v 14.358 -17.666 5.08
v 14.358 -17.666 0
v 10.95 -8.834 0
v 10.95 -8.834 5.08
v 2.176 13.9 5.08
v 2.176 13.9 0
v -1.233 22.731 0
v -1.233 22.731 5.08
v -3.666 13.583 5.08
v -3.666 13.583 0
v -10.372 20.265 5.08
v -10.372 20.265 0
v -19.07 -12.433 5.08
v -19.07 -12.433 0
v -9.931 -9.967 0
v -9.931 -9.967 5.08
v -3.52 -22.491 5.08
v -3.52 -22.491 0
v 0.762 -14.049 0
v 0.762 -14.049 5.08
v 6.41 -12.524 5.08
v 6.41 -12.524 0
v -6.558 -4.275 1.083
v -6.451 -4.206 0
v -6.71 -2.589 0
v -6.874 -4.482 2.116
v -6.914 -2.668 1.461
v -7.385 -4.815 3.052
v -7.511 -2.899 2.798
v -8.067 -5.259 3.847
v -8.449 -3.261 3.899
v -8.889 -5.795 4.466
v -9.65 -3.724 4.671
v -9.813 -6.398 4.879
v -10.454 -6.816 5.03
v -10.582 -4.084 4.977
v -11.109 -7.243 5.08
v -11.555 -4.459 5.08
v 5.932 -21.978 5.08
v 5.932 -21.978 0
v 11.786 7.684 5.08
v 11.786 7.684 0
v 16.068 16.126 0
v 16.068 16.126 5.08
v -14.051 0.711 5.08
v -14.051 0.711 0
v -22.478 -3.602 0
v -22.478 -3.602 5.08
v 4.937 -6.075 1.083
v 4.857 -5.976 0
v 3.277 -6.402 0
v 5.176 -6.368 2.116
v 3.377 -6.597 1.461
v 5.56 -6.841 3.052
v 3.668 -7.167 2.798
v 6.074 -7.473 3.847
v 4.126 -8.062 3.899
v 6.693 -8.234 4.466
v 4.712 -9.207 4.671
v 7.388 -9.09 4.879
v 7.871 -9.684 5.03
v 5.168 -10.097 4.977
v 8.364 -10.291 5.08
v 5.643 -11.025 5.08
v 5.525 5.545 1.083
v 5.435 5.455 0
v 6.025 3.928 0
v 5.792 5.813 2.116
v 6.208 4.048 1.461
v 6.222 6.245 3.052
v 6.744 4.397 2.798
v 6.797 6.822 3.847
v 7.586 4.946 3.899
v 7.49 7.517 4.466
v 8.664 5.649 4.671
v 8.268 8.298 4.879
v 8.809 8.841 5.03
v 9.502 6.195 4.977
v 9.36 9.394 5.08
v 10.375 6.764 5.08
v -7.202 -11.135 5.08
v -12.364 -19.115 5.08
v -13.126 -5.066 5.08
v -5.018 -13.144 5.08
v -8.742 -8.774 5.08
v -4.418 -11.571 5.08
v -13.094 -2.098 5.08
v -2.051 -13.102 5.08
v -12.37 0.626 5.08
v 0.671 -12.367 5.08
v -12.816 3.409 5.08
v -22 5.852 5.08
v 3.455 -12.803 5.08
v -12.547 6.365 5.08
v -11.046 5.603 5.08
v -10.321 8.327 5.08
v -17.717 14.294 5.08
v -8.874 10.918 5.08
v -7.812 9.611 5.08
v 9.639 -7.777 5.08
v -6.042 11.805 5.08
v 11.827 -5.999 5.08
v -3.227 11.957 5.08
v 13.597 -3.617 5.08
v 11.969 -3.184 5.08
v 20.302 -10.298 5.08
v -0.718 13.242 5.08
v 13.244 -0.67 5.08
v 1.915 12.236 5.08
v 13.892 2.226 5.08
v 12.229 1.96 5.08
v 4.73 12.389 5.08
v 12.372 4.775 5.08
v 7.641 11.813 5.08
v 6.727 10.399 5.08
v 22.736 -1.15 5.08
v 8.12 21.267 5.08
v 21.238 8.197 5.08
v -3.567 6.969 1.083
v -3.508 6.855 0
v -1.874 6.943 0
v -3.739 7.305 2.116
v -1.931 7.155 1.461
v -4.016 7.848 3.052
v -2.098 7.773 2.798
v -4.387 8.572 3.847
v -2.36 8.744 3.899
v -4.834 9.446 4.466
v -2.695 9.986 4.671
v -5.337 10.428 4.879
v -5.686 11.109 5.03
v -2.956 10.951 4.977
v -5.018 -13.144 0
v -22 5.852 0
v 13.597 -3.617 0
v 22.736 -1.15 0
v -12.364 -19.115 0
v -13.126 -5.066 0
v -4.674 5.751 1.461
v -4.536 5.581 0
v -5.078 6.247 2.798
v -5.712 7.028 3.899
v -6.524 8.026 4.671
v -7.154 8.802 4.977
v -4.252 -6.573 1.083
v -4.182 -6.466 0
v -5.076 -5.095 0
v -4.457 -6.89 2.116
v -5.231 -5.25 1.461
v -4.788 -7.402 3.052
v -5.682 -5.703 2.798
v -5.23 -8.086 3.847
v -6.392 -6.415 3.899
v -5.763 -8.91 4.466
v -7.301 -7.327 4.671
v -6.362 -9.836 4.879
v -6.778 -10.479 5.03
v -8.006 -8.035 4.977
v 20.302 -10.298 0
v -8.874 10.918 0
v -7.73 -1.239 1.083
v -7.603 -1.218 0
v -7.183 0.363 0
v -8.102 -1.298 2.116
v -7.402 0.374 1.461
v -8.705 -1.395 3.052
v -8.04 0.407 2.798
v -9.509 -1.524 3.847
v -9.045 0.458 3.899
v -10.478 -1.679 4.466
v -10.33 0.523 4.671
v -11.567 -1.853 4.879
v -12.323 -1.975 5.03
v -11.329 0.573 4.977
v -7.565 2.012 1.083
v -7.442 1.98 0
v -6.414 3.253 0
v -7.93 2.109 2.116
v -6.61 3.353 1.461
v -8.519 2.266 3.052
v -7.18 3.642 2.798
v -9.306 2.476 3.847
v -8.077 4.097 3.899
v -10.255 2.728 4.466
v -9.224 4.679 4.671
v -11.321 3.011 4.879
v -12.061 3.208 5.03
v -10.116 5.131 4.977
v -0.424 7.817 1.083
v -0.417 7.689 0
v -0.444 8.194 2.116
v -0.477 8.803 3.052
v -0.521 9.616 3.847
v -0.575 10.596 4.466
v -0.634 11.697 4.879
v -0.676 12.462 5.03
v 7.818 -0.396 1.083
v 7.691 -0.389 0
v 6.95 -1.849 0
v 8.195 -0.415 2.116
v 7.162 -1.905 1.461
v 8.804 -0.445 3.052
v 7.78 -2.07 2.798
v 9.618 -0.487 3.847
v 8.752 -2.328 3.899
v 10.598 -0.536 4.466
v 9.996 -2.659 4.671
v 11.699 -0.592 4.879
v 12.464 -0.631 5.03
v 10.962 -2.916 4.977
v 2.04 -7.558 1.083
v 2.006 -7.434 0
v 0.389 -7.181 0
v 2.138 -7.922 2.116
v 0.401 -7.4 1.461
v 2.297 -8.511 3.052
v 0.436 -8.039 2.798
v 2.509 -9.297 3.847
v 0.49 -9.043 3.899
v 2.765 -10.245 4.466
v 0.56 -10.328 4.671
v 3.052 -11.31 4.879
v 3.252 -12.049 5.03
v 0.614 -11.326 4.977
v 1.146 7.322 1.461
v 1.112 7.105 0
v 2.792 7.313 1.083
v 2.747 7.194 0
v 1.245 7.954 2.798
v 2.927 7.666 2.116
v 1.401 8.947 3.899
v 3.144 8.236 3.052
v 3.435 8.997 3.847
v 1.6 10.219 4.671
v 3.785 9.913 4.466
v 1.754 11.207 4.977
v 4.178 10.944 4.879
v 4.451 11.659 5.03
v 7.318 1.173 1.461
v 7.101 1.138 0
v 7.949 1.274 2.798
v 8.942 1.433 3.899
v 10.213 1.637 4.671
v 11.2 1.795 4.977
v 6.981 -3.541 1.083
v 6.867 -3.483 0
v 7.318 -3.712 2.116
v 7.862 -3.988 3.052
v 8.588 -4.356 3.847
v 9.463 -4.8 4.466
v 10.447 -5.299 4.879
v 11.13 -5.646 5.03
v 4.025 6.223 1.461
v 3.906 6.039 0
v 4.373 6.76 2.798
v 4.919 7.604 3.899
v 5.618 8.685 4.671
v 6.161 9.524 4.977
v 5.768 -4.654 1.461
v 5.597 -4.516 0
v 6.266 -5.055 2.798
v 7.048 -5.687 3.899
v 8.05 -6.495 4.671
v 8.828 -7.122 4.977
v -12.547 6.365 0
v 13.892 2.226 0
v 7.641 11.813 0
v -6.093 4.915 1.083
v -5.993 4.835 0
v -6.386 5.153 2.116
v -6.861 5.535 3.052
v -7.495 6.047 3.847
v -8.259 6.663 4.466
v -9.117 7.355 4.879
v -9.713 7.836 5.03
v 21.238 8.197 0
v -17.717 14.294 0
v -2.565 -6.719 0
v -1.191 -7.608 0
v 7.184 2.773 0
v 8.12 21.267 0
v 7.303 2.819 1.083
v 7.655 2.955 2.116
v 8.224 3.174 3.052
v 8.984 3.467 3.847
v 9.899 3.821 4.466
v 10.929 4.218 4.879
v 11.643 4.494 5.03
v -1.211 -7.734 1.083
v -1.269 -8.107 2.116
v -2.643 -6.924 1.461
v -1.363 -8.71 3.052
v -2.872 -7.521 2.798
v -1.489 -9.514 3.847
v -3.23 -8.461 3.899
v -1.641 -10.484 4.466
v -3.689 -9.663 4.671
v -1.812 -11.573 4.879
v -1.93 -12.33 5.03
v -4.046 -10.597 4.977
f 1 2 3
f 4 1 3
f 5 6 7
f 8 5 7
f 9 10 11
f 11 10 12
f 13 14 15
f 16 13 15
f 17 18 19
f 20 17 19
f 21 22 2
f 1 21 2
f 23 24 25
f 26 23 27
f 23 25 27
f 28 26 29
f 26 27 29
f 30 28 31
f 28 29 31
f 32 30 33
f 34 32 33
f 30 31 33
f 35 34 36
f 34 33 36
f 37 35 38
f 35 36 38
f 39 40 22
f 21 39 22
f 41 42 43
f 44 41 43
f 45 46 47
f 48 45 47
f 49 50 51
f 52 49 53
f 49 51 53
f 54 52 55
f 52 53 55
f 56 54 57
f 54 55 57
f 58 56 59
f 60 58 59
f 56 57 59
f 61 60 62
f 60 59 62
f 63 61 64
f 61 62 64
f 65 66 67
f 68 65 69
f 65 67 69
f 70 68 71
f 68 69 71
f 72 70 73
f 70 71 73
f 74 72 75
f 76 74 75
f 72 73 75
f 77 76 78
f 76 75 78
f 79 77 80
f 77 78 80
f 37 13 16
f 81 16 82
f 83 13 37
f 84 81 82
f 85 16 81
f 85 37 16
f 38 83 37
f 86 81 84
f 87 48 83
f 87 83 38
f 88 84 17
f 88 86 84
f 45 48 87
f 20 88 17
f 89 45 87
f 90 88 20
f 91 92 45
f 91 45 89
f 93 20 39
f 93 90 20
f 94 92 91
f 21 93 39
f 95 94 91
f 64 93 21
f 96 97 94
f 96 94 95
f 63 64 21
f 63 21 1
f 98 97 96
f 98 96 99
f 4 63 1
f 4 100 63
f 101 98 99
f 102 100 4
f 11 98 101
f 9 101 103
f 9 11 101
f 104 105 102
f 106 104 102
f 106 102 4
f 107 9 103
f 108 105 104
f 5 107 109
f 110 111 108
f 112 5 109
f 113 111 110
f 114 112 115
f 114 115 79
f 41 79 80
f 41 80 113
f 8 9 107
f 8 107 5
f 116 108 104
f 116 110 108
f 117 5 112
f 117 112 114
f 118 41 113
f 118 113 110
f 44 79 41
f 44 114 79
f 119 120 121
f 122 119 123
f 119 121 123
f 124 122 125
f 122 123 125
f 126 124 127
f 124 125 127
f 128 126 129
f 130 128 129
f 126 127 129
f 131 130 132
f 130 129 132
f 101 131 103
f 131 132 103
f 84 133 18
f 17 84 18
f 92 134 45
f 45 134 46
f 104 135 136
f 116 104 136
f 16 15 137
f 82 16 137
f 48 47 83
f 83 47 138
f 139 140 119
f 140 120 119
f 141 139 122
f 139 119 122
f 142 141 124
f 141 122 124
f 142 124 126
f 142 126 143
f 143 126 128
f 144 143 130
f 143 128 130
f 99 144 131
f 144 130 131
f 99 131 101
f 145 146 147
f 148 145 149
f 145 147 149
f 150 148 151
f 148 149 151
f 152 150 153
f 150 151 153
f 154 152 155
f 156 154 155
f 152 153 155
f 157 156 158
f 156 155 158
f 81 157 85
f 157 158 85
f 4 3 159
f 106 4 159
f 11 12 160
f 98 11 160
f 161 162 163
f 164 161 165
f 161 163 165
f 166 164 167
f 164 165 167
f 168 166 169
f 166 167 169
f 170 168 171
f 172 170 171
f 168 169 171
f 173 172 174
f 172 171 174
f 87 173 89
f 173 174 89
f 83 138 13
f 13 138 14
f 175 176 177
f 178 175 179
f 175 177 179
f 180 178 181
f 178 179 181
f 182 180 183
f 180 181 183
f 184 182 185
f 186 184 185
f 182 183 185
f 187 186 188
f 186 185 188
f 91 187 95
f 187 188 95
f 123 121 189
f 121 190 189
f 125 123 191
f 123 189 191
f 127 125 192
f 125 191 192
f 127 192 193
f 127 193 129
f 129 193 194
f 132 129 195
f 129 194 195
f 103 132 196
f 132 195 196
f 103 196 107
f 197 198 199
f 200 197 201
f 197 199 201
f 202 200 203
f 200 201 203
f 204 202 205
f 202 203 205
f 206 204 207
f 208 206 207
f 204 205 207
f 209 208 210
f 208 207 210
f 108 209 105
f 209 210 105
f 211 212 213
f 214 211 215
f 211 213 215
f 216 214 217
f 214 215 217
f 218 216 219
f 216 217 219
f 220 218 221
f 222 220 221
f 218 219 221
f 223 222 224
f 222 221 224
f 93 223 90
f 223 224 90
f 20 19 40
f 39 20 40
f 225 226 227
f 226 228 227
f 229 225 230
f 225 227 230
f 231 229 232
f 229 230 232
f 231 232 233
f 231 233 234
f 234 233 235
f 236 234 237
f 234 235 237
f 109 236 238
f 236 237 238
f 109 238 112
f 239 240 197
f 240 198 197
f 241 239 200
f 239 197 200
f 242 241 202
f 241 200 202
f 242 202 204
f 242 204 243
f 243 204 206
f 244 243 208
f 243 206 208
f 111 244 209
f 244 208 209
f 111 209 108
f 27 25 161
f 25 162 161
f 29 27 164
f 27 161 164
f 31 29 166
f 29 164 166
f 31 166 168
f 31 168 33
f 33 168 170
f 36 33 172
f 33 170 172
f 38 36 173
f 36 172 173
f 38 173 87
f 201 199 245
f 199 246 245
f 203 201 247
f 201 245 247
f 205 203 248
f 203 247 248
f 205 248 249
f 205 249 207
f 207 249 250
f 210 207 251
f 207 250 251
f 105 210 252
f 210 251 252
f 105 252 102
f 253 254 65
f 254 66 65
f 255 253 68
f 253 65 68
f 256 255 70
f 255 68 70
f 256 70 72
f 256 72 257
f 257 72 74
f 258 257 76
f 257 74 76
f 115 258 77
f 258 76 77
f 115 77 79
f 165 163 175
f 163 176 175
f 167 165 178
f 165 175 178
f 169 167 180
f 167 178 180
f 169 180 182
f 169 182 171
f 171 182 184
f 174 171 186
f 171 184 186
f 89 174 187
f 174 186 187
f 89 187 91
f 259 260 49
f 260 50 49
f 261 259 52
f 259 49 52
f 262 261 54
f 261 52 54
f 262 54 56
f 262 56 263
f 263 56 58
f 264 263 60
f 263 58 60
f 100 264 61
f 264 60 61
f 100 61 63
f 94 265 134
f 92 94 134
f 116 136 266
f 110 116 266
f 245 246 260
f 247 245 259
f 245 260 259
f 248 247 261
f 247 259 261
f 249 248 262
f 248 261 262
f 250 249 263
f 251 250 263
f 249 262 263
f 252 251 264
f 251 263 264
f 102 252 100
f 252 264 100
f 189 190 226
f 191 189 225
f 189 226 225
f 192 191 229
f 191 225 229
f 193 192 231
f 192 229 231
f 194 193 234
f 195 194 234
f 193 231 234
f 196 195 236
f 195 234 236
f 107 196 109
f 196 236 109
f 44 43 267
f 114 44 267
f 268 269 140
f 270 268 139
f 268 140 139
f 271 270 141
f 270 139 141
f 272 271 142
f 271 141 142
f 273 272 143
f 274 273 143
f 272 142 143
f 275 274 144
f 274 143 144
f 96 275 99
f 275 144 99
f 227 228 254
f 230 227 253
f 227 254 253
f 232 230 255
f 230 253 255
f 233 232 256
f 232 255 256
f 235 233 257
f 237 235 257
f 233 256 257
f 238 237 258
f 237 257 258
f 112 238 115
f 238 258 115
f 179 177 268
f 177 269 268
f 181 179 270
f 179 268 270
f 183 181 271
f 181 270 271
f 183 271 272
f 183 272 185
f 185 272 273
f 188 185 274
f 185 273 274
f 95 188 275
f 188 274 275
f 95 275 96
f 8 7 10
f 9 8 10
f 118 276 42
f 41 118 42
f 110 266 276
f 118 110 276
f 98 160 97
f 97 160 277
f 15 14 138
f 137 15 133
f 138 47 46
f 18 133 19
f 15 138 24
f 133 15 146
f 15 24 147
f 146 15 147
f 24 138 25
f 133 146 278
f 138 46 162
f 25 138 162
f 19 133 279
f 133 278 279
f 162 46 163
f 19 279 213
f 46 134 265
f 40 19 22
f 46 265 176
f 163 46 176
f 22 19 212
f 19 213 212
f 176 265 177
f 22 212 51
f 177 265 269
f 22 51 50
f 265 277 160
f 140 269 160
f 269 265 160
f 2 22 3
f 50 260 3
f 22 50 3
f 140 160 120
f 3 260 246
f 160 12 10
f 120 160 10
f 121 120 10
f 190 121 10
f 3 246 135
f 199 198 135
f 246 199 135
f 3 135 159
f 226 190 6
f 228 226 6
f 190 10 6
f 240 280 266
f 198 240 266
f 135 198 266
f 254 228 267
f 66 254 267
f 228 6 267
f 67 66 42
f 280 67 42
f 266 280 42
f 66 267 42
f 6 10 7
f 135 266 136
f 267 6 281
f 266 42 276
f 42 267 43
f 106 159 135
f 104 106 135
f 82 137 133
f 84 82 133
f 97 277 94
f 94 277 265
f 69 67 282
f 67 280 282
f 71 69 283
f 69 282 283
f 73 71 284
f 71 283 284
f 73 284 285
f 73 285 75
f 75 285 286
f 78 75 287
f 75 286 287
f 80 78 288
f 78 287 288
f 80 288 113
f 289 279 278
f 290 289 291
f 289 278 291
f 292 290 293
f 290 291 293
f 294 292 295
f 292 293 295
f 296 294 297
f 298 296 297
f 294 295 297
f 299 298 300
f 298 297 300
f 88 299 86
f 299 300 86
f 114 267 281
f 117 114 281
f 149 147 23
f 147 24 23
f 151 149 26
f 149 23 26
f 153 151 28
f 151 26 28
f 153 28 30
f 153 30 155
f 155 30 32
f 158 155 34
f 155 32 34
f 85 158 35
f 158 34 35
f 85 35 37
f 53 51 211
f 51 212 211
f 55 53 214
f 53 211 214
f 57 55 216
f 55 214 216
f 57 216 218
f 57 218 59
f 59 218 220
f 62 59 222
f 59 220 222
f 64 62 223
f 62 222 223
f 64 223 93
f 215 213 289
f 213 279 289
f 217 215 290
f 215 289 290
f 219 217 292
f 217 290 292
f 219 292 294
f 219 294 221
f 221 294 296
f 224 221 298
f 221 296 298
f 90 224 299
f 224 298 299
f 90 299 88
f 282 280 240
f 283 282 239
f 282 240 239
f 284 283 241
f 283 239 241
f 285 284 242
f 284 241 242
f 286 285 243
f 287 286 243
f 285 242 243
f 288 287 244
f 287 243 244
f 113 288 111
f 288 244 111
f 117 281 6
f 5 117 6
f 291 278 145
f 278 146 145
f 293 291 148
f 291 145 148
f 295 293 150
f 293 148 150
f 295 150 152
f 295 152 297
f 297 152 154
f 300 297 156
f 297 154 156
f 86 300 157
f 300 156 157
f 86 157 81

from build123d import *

# Parameters (mm, degrees)
F1_DEPTH = 5.08
F2_R     = 5.07999


# Not quite as in the source:
# - a fillet or chamfer is up to 0.001 mm smaller than in the source, because OpenCascade refuses the exact size


with BuildPart() as f1:
    # F0 (on Top) → F1 (new body)
    with BuildSketch(Plane.XY):
        Polygon((-21.999723834, 5.8521262697), (-14.0514369357, 0.7108895722), (-10.1598827967, 2.7026210629), (-12.5474815477, 6.3646642291), align=None)
        Polygon((-22.4780219717, -3.6019104497), (-13.1257712241, -5.0658043501), (-10.3807697977, -1.6634294271), (-14.0514369357, 0.7108895722), align=None)
        Polygon((-19.0696659041, -12.4331441299), (-9.930540424, -9.9665746788), (-8.8067273944, -5.7418578572), (-13.1257712241, -5.0658043501), align=None)
        Polygon((-9.930540424, -9.9665746788), (-12.3639913592, -19.1145742385), (-5.0182289685, -13.144033702), (-5.7099218179, -8.8274669008), align=None)
        Polygon((-1.6258188862, -10.3867267222), (-5.0182289685, -13.144033702), (-3.5204703849, -22.4909208108), (0.7617798649, -14.0487698884), align=None)
        Polygon((2.7394029011, -10.1500271328), (0.7617798649, -14.0487698884), (5.9317719013, -21.9783828513), (6.4100700391, -12.524346132), align=None)
        Polygon((6.6309570401, -8.1582956421), (6.4100700391, -12.524346132), (14.3583569374, -17.6655828295), (10.9500008698, -8.8343491493), align=None)
        Polygon((9.3759584665, -4.7559207191), (10.9500008698, -8.8343491493), (20.3022516175, -10.2982430497), (13.5965770725, -3.6168129411), align=None)
        Polygon((10.4997714961, -0.5312038976), (13.5965770725, -3.6168129411), (22.7357025527, -1.15024349), (13.8921815784, 2.2261030823), align=None)
        Polygon((9.8080786466, 3.7853629037), (13.8921815784, 2.2261030823), (21.2379439691, 8.1966436188), (11.7857016829, 7.6841056593), align=None)
        Polygon((7.6413668966, 11.8134565599), (7.4204798956, 7.44740607), (11.7857016829, 7.6841056593), (16.0679519327, 16.1262565817), align=None)
        Polygon((8.1196650343, 21.2674932792), (2.1757703543, 13.9001534994), (3.7498127576, 9.8217250692), (7.6413668966, 11.8134565599), align=None)
        Polygon((-1.2325857133, 22.7313871796), (-3.6660366485, 13.5833876199), (-0.5692310721, 10.4977785763), (2.1757703543, 13.9001534994), align=None)
        Polygon((-8.8739526099, 10.9179306197), (-4.7898496782, 9.3586707984), (-3.6660366485, 13.5833876199), (-10.3717111935, 20.2648177285), align=None)
        Polygon((-17.7174735842, 14.294277192), (-12.5474815477, 6.3646642291), (-8.1822597605, 6.6013638185), (-8.8739526099, 10.9179306197), align=None)
        Polygon((-12.5474815477, 6.3646642291), (-10.1598827967, 2.7026210629), (-7.7547700697, 3.9335788206), (-8.1822597605, 6.6013638185), align=None)
        Polygon((-14.0514369357, 0.7108895722), (-10.3807697977, -1.6634294271), (-8.684265617, 0.4393539178), (-10.1598827967, 2.7026210629), align=None)
        Polygon((-13.1257712241, -5.0658043501), (-8.8067273944, -5.7418578572), (-8.112172745, -3.1308392687), (-10.3807697977, -1.6634294271), align=None)
        Polygon((-8.8067273944, -5.7418578572), (-9.930540424, -9.9665746788), (-5.7099218179, -8.8274669008), (-6.1374115087, -6.1596819029), align=None)
        Polygon((-5.7099218179, -8.8274669008), (-5.0182289685, -13.144033702), (-1.6258188862, -10.3867267222), (-3.1014360658, -8.1234595771), align=None)
        Polygon((0.4708058484, -8.6826172912), (-1.6258188862, -10.3867267222), (0.7617798649, -14.0487698884), (2.7394029011, -10.1500271328), align=None)
        Polygon((3.9616411544, -7.7404715965), (2.7394029011, -10.1500271328), (6.4100700391, -12.524346132), (6.6309570401, -8.1582956421), align=None)
        Polygon((6.7674727144, -5.4599280427), (6.6309570401, -8.1582956421), (10.9500008698, -8.8343491493), (9.3759584665, -4.7559207191), align=None)
        Polygon((8.4031467615, -2.2353133286), (9.3759584665, -4.7559207191), (13.5965770725, -3.6168129411), (10.4997714961, -0.5312038976), align=None)
        Polygon((8.5858403933, 1.3758073673), (10.4997714961, -0.5312038976), (13.8921815784, 2.2261030823), (9.8080786466, 3.7853629037), align=None)
        Polygon((7.4204798956, 7.44740607), (7.2839642213, 4.7490384706), (9.8080786466, 3.7853629037), (11.7857016829, 7.6841056593), align=None)
        Polygon((3.7498127576, 9.8217250692), (4.7226244626, 7.3011176786), (7.4204798956, 7.44740607), (7.6413668966, 11.8134565599), align=None)
        Polygon((2.1757703543, 13.9001534994), (-0.5692310721, 10.4977785763), (1.3447000307, 8.5907673114), (3.7498127576, 9.8217250692), align=None)
        Polygon((-3.6660366485, 13.5833876199), (-4.7898496782, 9.3586707984), (-2.2657352528, 8.3949952315), (-0.5692310721, 10.4977785763), align=None)
        Polygon((-8.1822597605, 6.6013638185), (-5.4844043275, 6.7476522098), (-4.7898496782, 9.3586707984), (-8.8739526099, 10.9179306197), align=None)
        Polygon((-10.1598827967, 2.7026210629), (-8.684265617, 0.4393539178), (-7.4416532636, 1.979547329), (-7.7547700697, 3.9335788206), align=None)
        Polygon((-10.3807697977, -1.6634294271), (-8.112172745, -3.1308392687), (-7.6034429717, -1.2183865968), (-8.684265617, 0.4393539178), align=None)
        Polygon((-8.112172745, -3.1308392687), (-8.8067273944, -5.7418578572), (-6.1374115087, -6.1596819029), (-6.4505283149, -4.2056504113), align=None)
        Polygon((-6.1374115087, -6.1596819029), (-5.7099218179, -8.8274669008), (-3.1014360658, -8.1234595771), (-4.1822587112, -6.4657190625), align=None)
        Polygon((-3.1014360658, -8.1234595771), (-1.6258188862, -10.3867267222), (0.4708058484, -8.6826172912), (-1.1908385817, -7.6078061486), align=None)
        Polygon((2.0064883569, -7.4344344369), (0.4708058484, -8.6826172912), (2.7394029011, -10.1500271328), (3.9616411544, -7.7404715965), align=None)
        Polygon((4.8568752303, -5.9755814713), (3.9616411544, -7.7404715965), (6.6309570401, -8.1582956421), (6.7674727144, -5.4599280427), align=None)
        Polygon((6.867464253, -3.4834961829), (6.7674727144, -5.4599280427), (9.3759584665, -4.7559207191), (8.4031467615, -2.2353133286), align=None)
        Polygon((7.6906063175, -0.3890827578), (8.4031467615, -2.2353133286), (10.4997714961, -0.5312038976), (8.5858403933, 1.3758073673), align=None)
        Polygon((7.2839642213, 4.7490384706), (7.1839726826, 2.7726066107), (8.5858403933, 1.3758073673), (9.8080786466, 3.7853629037), align=None)
        Polygon((4.7226244626, 7.3011176786), (5.4351649066, 5.4548871079), (7.2839642213, 4.7490384706), (7.4204798956, 7.44740607), align=None)
        Polygon((-0.5692310721, 10.4977785763), (-2.2657352528, 8.3949952315), (-0.4169359382, 7.6891465941), (1.3447000307, 8.5907673114), align=None)
        Polygon((-4.7898496782, 9.3586707984), (-5.4844043275, 6.7476522098), (-3.5083476063, 6.8548018203), (-2.2657352528, 8.3949952315), align=None)
        Polygon((-7.4416532636, 1.979547329), (-6.4138998748, 3.2534273071), (-5.9931341009, 4.8351995379), (-7.7547700697, 3.9335788206), align=None)
        Polygon((-8.684265617, 0.4393539178), (-7.6034429717, -1.2183865968), (-7.1826771978, 0.363385634), (-7.4416532636, 1.979547329), align=None)
        Polygon((-7.6034429717, -1.2183865968), (-8.112172745, -3.1308392687), (-6.4505283149, -4.2056504113), (-6.7095043807, -2.5894887164), align=None)
        Polygon((-6.4505283149, -4.2056504113), (-6.1374115087, -6.1596819029), (-4.1822587112, -6.4657190625), (-5.0761973022, -5.0946169429), align=None)
        Polygon((-4.1822587112, -6.4657190625), (-3.1014360658, -8.1234595771), (-1.1908385817, -7.6078061486), (-2.5651695944, -6.7188396169), align=None)
        Polygon((-1.1908385817, -7.6078061486), (0.4708058484, -8.6826172912), (2.0064883569, -7.4344344369), (0.3893992401, -7.1813138824), align=None)
        Polygon((3.2766374084, -6.4020737375), (2.0064883569, -7.4344344369), (3.9616411544, -7.7404715965), (4.8568752303, -5.9755814713), align=None)
        Polygon((5.5973152015, -4.5158568823), (4.8568752303, -5.9755814713), (6.7674727144, -5.4599280427), (6.867464253, -3.4834961829), align=None)
        Polygon((6.9501663462, -1.8488073469), (6.867464253, -3.4834961829), (8.4031467615, -2.2353133286), (7.6906063175, -0.3890827578), align=None)
        Polygon((7.1839726826, 2.7726066107), (7.1012705894, 1.1379177747), (7.6906063175, -0.3890827578), (8.5858403933, 1.3758073673), align=None)
        Polygon((1.3447000307, 8.5907673114), (2.7465677414, 7.1939680681), (4.7226244626, 7.3011176786), (3.7498127576, 9.8217250692), align=None)
        Polygon((4.7226244626, 7.3011176786), (2.7465677414, 7.1939680681), (3.9060397893, 6.0386881034), (5.4351649066, 5.4548871079), align=None)
        Polygon((-0.4169359382, 7.6891465941), (1.1121891791, 7.1053455986), (2.7465677414, 7.1939680681), (1.3447000307, 8.5907673114), align=None)
        Polygon((-2.2657352528, 8.3949952315), (-3.5083476063, 6.8548018203), (-1.873969044, 6.9434242898), (-0.4169359382, 7.6891465941), align=None)
        Polygon((-5.4844043275, 6.7476522098), (-5.9931341009, 4.8351995379), (-4.536100995, 5.5809218422), (-3.5083476063, 6.8548018203), align=None)
        Polygon((-7.7547700697, 3.9335788206), (-5.9931341009, 4.8351995379), (-5.4844043275, 6.7476522098), (-8.1822597605, 6.6013638185), align=None)
        Polygon((5.4351649066, 5.4548871079), (6.0245006347, 3.9278865754), (7.1839726826, 2.7726066107), (7.2839642213, 4.7490384706), align=None)
    extrude(amount=F1_DEPTH)

    # F2 (radius 5.08 in the source; OpenCascade refuses exactly that, so slightly less here)
    f2_edges = [f1.edges().sort_by_distance(p)[0] for p in [
        (-6.203517, 4.044313, 5.08),
        (-6.927777, 2.616487, 5.08),
        (-7.312165, 1.171466, 5.08),
        (-7.39306, -0.4275, 5.08),
        (-7.156474, -1.903938, 5.08),
        (-6.580016, -3.39757, 5.08),
        (-5.763363, -4.650134, 5.08),
        (-4.629228, -5.780168, 5.08),
        (-3.373714, -6.592279, 5.08),
        (-1.878004, -7.163323, 5.08),
        (-0.40072, -7.39456, 5.08),
        (1.197944, -7.307874, 5.08),
        (2.641563, -6.918254, 5.08),
        (4.066756, -6.188828, 5.08),
        (5.227095, -5.245719, 5.08),
        (6.908815, -2.666152, 5.08),
        (7.320386, -1.118945, 5.08),
        (7.395938, 0.374418, 5.08),
        (7.142622, 1.955262, 5.08),
        (6.604237, 3.350247, 5.08),
        (3.326304, 6.616328, 5.08),
        (5.729833, 4.691387, 5.08),
        (4.670602, 5.746788, 5.08),
        (1.929378, 7.149657, 5.08),
        (0.347627, 7.397246, 5.08),
        (-1.145452, 7.316285, 5.08),
        (-2.691158, 6.899113, 5.08),
        (-4.022224, 6.217862, 5.08),
        (-5.264618, 5.208061, 5.08),
        (6.23239, -3.999677, 5.08),
    ]]
    fillet(f2_edges, radius=F2_R)


solid = f1.part
